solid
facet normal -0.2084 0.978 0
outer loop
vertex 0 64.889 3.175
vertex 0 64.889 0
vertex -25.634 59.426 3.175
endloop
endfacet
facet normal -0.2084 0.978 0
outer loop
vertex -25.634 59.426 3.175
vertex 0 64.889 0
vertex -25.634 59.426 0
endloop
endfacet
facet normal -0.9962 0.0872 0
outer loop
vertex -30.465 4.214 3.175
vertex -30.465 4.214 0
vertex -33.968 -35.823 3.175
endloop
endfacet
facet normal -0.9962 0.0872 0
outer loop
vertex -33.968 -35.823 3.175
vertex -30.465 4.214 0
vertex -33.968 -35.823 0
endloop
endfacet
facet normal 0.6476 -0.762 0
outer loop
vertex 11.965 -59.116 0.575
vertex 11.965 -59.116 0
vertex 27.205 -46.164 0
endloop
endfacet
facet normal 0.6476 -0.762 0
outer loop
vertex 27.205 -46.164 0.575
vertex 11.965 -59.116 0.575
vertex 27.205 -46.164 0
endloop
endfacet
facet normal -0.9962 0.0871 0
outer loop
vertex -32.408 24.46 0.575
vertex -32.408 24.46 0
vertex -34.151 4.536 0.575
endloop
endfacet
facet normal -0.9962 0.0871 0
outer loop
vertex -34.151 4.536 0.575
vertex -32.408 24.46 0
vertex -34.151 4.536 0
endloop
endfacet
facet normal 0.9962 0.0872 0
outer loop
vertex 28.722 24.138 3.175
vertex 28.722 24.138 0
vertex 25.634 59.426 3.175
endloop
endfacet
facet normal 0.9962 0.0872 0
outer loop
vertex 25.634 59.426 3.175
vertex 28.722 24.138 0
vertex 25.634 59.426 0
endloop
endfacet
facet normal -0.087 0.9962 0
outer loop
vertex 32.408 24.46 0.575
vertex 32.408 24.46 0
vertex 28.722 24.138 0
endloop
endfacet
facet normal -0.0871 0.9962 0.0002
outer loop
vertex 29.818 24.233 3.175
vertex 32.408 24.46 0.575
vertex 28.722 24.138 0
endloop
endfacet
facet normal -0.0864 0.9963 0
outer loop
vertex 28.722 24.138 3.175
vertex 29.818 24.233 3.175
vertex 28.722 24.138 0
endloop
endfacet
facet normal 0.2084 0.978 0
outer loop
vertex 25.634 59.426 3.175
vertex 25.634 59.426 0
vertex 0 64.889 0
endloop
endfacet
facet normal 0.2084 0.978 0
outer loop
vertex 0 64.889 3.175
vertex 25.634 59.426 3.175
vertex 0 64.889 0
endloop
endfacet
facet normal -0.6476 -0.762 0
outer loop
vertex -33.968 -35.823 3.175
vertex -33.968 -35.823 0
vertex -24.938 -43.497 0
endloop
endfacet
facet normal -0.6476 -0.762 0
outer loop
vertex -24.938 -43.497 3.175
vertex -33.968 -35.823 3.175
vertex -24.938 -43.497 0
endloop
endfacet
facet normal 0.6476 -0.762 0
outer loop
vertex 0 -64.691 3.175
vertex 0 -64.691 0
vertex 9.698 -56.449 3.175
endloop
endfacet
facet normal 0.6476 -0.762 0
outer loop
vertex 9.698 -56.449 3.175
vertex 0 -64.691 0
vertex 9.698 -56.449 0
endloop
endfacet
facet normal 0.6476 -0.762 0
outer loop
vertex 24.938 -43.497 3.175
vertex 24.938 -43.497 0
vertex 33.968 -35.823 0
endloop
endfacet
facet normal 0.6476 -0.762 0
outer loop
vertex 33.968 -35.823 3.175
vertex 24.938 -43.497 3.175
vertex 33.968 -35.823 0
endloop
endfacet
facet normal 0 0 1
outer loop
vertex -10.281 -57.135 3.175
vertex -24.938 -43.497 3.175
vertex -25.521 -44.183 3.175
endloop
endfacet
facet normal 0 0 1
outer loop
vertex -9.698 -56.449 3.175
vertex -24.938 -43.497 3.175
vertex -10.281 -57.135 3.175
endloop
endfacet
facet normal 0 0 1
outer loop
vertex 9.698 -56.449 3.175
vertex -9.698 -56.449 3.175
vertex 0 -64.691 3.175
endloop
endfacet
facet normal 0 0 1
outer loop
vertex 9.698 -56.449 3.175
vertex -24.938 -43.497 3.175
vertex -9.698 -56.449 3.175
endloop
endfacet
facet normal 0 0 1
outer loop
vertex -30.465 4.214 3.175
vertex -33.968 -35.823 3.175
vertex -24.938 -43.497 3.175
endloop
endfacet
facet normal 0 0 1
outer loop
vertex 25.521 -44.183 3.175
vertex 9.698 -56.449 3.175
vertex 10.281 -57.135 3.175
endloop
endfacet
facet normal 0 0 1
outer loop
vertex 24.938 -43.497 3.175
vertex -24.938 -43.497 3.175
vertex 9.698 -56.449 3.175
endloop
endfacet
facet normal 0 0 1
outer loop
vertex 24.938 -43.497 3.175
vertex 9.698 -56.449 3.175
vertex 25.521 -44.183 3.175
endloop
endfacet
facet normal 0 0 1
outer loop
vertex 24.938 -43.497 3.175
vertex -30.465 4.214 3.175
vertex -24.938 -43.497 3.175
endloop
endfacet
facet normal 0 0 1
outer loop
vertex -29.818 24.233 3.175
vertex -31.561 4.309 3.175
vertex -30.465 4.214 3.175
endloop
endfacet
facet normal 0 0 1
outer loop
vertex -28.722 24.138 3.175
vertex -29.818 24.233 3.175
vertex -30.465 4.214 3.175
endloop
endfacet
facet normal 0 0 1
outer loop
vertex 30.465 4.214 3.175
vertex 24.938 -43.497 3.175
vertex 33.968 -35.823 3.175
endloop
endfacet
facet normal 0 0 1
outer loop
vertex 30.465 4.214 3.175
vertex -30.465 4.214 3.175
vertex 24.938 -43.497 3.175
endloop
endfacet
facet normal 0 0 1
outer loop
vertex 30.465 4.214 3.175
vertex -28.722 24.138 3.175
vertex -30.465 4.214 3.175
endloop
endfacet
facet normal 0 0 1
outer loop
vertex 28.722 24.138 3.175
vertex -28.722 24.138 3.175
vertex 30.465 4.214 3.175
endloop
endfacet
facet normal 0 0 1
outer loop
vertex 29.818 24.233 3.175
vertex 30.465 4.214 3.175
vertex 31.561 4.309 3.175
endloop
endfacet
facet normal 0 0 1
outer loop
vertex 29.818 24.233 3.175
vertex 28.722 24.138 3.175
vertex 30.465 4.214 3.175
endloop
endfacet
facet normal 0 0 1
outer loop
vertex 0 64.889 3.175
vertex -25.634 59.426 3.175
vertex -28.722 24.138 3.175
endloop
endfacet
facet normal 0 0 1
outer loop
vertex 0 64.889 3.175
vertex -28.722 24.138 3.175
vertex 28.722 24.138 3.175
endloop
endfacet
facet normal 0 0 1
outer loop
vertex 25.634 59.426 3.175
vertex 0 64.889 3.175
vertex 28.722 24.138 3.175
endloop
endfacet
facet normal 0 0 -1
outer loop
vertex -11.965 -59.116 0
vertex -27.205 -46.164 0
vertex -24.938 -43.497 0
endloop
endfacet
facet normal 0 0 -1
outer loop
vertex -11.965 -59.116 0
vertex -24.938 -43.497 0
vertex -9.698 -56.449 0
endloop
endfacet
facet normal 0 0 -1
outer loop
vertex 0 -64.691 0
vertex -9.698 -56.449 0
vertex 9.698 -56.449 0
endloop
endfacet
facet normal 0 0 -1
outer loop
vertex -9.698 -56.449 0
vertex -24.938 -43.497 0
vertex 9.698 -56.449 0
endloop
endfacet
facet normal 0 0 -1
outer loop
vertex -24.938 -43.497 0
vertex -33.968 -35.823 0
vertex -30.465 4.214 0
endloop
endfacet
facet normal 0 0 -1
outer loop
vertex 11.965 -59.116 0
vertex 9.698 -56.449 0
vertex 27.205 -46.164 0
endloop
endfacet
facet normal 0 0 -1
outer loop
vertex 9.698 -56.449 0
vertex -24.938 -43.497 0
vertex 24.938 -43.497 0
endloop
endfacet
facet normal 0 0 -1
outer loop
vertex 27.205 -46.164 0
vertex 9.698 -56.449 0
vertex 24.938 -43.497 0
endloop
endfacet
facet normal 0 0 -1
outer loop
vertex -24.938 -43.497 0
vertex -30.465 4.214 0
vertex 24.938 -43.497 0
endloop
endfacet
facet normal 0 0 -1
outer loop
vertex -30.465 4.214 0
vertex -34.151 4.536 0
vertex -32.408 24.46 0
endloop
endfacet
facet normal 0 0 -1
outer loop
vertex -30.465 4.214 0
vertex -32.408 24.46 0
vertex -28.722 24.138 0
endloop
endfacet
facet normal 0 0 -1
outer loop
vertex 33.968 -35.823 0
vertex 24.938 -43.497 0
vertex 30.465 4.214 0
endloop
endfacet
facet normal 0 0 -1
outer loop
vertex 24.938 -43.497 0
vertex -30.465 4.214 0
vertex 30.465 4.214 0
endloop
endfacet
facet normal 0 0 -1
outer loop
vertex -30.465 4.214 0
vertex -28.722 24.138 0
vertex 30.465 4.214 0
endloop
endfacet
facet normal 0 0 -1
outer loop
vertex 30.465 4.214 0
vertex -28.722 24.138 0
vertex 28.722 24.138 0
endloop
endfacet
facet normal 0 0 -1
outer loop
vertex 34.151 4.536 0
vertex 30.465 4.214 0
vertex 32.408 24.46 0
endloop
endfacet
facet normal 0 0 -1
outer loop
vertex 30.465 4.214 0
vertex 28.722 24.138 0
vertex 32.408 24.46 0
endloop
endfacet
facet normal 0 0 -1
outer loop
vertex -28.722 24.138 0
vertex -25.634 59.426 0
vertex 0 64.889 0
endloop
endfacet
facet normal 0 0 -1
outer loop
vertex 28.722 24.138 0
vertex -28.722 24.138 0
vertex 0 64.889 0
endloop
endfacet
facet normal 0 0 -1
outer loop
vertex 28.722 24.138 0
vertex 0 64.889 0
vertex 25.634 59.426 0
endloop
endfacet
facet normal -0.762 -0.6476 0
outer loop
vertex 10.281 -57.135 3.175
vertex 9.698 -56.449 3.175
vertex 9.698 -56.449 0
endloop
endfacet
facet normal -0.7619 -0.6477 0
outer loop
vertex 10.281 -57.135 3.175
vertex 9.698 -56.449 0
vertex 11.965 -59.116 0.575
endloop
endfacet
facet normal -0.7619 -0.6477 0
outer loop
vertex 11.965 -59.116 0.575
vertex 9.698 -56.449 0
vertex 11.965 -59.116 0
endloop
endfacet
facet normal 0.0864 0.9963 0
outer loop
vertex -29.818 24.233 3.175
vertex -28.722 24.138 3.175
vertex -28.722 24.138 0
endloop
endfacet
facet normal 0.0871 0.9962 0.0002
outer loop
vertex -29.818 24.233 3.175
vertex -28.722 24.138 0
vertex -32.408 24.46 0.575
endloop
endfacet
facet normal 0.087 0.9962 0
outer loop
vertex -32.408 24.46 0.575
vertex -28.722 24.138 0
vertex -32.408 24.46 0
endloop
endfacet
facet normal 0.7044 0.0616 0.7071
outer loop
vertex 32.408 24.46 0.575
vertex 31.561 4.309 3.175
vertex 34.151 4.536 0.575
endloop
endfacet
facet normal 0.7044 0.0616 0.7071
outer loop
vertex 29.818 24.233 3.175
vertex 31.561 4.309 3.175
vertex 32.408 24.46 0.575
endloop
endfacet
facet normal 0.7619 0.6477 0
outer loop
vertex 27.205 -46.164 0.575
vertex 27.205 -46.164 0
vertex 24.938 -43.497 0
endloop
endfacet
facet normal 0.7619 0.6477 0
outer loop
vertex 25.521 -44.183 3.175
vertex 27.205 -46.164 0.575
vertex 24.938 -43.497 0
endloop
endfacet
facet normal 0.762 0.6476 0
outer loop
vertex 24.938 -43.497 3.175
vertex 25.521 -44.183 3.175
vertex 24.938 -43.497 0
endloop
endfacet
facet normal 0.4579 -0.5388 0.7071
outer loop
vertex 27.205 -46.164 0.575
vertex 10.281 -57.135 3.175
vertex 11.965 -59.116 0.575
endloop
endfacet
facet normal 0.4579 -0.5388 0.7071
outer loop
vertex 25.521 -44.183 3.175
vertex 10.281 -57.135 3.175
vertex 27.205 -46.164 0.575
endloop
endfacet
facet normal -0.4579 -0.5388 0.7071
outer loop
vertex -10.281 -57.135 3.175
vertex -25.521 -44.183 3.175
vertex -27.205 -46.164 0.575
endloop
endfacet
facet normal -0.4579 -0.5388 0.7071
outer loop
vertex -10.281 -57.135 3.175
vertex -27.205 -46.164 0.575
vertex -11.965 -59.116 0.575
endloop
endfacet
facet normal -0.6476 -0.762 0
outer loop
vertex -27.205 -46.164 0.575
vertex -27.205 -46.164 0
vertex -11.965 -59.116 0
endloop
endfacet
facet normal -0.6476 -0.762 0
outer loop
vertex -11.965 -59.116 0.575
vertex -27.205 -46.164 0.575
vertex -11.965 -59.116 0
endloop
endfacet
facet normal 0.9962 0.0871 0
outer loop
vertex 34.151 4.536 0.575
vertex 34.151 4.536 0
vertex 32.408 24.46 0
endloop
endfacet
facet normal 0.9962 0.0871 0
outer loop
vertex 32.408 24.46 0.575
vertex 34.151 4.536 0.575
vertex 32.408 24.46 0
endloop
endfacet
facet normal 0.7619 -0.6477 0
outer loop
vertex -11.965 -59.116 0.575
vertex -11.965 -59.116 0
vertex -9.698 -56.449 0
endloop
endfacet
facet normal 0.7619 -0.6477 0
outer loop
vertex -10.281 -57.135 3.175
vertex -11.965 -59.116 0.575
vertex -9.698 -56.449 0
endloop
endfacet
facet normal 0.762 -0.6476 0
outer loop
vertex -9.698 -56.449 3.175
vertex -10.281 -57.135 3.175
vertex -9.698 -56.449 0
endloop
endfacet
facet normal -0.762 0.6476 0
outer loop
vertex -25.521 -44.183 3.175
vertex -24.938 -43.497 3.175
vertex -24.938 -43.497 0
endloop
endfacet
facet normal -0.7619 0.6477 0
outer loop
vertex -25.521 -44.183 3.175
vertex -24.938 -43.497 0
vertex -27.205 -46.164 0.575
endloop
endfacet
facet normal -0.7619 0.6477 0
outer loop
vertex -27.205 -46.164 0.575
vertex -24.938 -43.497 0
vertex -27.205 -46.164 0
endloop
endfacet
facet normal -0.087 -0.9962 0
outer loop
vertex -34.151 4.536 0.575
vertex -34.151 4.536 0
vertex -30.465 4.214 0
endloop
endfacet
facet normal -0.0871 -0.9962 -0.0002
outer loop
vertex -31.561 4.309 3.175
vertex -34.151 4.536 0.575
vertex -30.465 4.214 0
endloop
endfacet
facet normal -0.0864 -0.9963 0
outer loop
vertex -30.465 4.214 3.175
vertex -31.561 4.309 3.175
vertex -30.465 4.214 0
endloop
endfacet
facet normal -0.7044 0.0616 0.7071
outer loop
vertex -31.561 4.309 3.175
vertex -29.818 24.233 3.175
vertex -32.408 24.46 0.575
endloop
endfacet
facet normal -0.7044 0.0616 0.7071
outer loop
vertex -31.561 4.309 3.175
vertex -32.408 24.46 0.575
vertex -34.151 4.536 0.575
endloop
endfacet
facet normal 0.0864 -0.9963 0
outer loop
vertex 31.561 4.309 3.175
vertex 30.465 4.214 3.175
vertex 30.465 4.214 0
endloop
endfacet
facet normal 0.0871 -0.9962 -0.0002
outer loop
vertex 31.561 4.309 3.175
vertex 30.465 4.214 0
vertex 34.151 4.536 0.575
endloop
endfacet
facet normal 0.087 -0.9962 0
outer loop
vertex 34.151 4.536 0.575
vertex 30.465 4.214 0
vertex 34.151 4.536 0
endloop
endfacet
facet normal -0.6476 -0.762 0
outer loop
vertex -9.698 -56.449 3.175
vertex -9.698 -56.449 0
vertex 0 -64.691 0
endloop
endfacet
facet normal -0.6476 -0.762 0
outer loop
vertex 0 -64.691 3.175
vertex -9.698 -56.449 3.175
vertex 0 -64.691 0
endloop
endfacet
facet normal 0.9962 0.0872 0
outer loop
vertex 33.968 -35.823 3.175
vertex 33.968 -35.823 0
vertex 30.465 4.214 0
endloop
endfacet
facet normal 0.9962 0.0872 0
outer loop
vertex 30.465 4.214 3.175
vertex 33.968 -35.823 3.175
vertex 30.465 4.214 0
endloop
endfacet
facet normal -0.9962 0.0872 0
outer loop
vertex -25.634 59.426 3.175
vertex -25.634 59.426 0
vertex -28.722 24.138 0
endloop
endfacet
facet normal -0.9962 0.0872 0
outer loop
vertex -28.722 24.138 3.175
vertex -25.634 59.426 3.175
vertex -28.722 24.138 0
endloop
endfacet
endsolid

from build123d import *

# Parameters (mm, degrees)
BOSS_EXTRUDE2_DEPTH = 3.175
CHAMFER3_SIZE       = 2.6


with BuildPart() as part:
    # Sketch2 → Boss-Extrude2 (new body)
    with BuildSketch(Plane.XY):
        Polygon((33.967630838, -35.823456397), (25.63439182, 59.425901431), (0, 64.888689731), (-25.63439182, 59.425901431), (-33.967630838, -35.823456397), (0, -64.691310269), align=None)
        Polygon((-30.464841537, 4.213608519), (-28.721726682, 24.137502481), (-32.407647065, 24.459978729), (-34.15076192, 4.536084767), align=None)
        Polygon((32.407647065, 24.459978729), (28.721726682, 24.137502481), (30.464841537, 4.213608519), (34.15076192, 4.536084767), align=None)
        Polygon((27.2046006, -46.164342336), (24.938042288, -43.497375254), (9.698230388, -56.449137036), (11.9647887, -59.116104119), align=None)
        Polygon((-9.698230388, -56.449137036), (-24.938042288, -43.497375254), (-27.2046006, -46.164342336), (-11.9647887, -59.116104119), align=None)
    extrude(amount=BOSS_EXTRUDE2_DEPTH)

    # Chamfer3
    chamfer3_edges = [part.edges().sort_by_distance(p)[0] for p in [
        (19.58469465, -52.640223227, 3.175),
        (33.279204493, 14.498031748, 3.175),
        (-33.279204493, 14.498031748, 3.175),
        (-19.58469465, -52.640223227, 3.175),
    ]]
    chamfer(chamfer3_edges, length=CHAMFER3_SIZE)


solid = part.part
